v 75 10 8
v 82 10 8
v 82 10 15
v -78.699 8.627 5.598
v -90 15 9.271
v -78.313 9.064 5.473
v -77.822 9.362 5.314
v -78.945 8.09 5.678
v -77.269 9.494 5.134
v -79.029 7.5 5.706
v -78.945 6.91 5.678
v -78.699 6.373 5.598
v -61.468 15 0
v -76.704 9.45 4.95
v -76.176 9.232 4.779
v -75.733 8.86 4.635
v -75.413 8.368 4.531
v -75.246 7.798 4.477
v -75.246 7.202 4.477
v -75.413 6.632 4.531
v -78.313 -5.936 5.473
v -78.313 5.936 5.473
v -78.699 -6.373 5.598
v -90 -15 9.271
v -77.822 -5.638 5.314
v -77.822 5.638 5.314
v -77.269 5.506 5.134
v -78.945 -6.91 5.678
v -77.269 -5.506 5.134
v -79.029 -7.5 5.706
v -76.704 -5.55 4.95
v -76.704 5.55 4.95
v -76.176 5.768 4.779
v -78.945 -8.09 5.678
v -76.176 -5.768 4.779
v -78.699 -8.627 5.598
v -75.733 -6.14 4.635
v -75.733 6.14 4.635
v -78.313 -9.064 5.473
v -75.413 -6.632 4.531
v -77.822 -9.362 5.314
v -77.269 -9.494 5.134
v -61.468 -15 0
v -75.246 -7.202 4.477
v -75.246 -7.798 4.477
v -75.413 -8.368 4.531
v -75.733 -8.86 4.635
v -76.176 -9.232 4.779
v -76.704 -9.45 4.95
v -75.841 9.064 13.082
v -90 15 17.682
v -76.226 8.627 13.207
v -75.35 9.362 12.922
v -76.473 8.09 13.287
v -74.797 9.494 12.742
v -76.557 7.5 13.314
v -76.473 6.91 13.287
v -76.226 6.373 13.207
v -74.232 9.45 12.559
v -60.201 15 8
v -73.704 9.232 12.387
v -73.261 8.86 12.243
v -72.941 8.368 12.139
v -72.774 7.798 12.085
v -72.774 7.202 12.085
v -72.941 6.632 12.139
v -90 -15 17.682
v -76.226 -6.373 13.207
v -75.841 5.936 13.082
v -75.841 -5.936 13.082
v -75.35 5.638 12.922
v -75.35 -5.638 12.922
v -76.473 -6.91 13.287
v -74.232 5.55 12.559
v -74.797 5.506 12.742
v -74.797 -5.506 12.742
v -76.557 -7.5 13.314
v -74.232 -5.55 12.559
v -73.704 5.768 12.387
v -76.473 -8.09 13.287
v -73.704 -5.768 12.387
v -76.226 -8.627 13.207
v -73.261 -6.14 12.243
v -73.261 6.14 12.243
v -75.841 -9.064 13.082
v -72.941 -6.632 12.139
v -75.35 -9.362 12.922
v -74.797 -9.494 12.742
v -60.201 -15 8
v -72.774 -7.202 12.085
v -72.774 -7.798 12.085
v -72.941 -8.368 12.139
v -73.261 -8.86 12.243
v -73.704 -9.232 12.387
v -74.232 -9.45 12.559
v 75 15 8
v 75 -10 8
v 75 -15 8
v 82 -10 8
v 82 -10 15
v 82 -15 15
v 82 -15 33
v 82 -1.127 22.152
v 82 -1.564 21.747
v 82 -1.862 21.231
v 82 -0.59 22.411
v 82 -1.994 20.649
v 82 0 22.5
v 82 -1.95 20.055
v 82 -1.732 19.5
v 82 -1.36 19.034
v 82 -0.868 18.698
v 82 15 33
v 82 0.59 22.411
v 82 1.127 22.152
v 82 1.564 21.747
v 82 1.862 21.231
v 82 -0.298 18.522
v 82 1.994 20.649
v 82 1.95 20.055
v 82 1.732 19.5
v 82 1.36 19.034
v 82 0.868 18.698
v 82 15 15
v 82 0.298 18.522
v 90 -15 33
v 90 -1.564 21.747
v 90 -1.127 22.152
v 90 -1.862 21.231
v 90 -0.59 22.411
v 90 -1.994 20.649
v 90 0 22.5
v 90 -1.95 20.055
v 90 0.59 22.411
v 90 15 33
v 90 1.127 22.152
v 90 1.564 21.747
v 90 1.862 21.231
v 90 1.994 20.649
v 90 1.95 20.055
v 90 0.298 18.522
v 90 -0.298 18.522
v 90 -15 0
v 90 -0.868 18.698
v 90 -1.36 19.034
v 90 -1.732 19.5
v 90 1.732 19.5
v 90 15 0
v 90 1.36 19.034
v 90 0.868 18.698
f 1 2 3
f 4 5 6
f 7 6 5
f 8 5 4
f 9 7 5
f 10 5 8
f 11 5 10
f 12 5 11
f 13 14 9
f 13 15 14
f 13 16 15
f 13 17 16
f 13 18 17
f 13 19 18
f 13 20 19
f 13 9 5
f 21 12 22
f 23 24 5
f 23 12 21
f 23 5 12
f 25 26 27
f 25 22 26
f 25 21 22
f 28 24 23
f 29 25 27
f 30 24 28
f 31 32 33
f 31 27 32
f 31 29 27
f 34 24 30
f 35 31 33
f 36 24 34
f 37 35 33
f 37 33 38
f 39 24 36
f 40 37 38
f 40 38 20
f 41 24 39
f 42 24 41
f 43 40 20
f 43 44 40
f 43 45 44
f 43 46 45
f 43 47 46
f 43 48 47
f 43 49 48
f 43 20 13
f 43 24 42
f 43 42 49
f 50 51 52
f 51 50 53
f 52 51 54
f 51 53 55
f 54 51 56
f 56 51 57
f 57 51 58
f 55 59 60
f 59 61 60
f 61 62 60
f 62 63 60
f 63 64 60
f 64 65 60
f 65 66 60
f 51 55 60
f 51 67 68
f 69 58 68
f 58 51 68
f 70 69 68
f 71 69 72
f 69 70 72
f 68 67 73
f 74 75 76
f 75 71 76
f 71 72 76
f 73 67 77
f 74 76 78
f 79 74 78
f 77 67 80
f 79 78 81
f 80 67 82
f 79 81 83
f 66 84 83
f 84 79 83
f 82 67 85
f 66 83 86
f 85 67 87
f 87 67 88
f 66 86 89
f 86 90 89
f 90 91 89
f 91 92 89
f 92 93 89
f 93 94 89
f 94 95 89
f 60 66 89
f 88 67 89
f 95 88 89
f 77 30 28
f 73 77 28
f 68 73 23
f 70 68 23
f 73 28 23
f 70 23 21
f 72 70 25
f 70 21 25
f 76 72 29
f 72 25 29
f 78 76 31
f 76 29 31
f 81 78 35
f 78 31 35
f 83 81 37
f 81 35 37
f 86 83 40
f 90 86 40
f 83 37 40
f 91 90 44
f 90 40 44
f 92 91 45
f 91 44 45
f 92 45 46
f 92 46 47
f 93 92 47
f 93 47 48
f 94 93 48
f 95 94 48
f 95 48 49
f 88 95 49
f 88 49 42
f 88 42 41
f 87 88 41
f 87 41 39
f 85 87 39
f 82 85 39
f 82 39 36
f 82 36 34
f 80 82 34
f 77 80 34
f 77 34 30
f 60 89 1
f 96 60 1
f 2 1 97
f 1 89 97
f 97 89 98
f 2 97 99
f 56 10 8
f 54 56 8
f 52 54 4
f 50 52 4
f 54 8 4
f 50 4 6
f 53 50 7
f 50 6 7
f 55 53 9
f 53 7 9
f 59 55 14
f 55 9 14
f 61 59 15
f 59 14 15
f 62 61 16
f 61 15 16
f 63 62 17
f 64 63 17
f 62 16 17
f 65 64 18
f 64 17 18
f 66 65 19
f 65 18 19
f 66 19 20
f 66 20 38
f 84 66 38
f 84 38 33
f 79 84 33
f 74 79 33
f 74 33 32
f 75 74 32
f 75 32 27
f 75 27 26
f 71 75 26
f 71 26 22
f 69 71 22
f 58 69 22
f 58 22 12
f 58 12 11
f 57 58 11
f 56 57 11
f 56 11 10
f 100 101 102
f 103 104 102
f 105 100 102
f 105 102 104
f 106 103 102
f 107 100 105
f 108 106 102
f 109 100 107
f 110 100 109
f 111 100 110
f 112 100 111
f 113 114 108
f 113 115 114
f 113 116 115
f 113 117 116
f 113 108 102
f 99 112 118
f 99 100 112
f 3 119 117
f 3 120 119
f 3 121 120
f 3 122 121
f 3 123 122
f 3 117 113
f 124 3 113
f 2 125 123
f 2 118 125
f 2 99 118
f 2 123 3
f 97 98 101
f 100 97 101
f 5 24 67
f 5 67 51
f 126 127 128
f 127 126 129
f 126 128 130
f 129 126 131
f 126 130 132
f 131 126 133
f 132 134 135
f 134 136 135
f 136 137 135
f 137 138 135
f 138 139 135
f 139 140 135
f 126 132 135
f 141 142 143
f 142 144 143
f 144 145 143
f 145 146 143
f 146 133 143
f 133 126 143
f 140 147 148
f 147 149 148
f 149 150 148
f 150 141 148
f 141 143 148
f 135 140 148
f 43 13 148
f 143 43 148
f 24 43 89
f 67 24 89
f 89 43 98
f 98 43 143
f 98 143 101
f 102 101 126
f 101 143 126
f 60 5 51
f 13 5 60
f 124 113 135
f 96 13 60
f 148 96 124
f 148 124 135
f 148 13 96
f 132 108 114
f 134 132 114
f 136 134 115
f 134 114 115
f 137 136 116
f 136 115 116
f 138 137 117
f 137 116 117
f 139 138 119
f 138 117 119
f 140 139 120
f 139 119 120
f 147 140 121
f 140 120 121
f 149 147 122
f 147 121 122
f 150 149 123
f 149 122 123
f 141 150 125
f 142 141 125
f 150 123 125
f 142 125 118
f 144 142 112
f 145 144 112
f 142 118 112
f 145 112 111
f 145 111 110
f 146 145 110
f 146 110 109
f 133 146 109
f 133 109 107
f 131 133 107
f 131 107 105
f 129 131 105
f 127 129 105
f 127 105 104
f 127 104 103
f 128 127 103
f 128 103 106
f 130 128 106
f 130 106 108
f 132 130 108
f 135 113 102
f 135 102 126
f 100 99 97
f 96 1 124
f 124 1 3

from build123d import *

# Parameters (mm, degrees)
SKETCH1_W           = 180
SKETCH1_H           = 30
BOSS_EXTRUDE1_DEPTH = 50
CUT_EXTRUDE1_DEPTH  = 108.238052948
CUT_EXTRUDE2_DEPTH  = 108.238052948
SKETCH4_W           = 8
SKETCH4_H           = 30
BOSS_EXTRUDE2_DEPTH = 25
SKETCH5_W           = 7
SKETCH5_H           = 5
BOSS_EXTRUDE3_DEPTH = 7
CUT_EXTRUDE3_DEPTH  = 101.444014257
SKETCH7_R           = 2
CUT_EXTRUDE4_DEPTH  = 15
SKETCH8_R           = 2
CUT_EXTRUDE5_DEPTH  = 110.652369188


with BuildPart() as part:
    # Sketch1 → Boss-Extrude1 (new body)
    with BuildSketch(Plane.XY):
        Rectangle(SKETCH1_W, SKETCH1_H)
    extrude(amount=BOSS_EXTRUDE1_DEPTH)

    # Sketch2 → Cut-Extrude1 (cut, through all)
    with BuildSketch(Plane.XZ.offset(15)):
        Polygon((-90, 9.270509831), (-61.468304511, 0), (-90, 0), align=None)
    extrude(amount=-CUT_EXTRUDE1_DEPTH, mode=Mode.SUBTRACT)

    # Sketch3 → Cut-Extrude2 (cut, through all)
    with BuildSketch(Plane.XZ.offset(15)):
        Polygon((-90, 17.682207625), (-60.201228989, 8), (90, 8), (90, 50), (-90, 50), align=None)
    extrude(amount=-CUT_EXTRUDE2_DEPTH, mode=Mode.SUBTRACT)

    # Sketch4 → Boss-Extrude2 (add)
    with BuildSketch(Plane.XY.offset(8)):
        with Locations((86, 0)):
            Rectangle(SKETCH4_W, SKETCH4_H)
    extrude(amount=BOSS_EXTRUDE2_DEPTH)

    # Sketch5 → Boss-Extrude3 (add)
    with BuildSketch(Plane.ZY.offset(-82)):
        with Locations((11.5, -12.5)):
            Rectangle(SKETCH5_W, SKETCH5_H)
        with Locations((11.5, 12.5)):
            Rectangle(SKETCH5_W, SKETCH5_H)
    extrude(amount=BOSS_EXTRUDE3_DEPTH)

    # Sketch6 → Cut-Extrude3 (cut, through all)
    with BuildSketch(Plane.XZ.offset(15)):
        Polygon((75, 8), (82, 15), (75, 15), align=None)
    extrude(amount=-CUT_EXTRUDE3_DEPTH, mode=Mode.SUBTRACT)

    # Sketch7 → Cut-Extrude4 (cut)
    with BuildSketch(Plane.ZY.offset(-82)):
        with Locations((20.5, 0)):
            Circle(SKETCH7_R)
    extrude(amount=-CUT_EXTRUDE4_DEPTH, mode=Mode.SUBTRACT)

    # Sketch8 → Cut-Extrude5 (cut, through all)
    with BuildSketch(Plane(origin=(-5.869700773, 0, -18.065081438), x_dir=(-0.9510565162951532, 0, 0.30901699437494884), z_dir=(-0.30901699437494884, 0, -0.9510565162951532))):
        with Locations((74.92439222, 7.5)):
            Circle(SKETCH8_R)
        with Locations((74.92439222, -7.5)):
            Circle(SKETCH8_R)
    extrude(amount=-CUT_EXTRUDE5_DEPTH, mode=Mode.SUBTRACT)


solid = part.part
